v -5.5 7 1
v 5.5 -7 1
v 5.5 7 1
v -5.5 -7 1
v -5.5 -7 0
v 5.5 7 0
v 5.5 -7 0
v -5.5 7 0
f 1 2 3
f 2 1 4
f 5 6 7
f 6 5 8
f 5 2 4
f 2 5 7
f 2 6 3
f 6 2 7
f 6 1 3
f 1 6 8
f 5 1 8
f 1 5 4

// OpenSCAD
color ("black") {
    translate([-11/2,-14/2,0]) {        
        cube( [11,14,1] );
    }
}
